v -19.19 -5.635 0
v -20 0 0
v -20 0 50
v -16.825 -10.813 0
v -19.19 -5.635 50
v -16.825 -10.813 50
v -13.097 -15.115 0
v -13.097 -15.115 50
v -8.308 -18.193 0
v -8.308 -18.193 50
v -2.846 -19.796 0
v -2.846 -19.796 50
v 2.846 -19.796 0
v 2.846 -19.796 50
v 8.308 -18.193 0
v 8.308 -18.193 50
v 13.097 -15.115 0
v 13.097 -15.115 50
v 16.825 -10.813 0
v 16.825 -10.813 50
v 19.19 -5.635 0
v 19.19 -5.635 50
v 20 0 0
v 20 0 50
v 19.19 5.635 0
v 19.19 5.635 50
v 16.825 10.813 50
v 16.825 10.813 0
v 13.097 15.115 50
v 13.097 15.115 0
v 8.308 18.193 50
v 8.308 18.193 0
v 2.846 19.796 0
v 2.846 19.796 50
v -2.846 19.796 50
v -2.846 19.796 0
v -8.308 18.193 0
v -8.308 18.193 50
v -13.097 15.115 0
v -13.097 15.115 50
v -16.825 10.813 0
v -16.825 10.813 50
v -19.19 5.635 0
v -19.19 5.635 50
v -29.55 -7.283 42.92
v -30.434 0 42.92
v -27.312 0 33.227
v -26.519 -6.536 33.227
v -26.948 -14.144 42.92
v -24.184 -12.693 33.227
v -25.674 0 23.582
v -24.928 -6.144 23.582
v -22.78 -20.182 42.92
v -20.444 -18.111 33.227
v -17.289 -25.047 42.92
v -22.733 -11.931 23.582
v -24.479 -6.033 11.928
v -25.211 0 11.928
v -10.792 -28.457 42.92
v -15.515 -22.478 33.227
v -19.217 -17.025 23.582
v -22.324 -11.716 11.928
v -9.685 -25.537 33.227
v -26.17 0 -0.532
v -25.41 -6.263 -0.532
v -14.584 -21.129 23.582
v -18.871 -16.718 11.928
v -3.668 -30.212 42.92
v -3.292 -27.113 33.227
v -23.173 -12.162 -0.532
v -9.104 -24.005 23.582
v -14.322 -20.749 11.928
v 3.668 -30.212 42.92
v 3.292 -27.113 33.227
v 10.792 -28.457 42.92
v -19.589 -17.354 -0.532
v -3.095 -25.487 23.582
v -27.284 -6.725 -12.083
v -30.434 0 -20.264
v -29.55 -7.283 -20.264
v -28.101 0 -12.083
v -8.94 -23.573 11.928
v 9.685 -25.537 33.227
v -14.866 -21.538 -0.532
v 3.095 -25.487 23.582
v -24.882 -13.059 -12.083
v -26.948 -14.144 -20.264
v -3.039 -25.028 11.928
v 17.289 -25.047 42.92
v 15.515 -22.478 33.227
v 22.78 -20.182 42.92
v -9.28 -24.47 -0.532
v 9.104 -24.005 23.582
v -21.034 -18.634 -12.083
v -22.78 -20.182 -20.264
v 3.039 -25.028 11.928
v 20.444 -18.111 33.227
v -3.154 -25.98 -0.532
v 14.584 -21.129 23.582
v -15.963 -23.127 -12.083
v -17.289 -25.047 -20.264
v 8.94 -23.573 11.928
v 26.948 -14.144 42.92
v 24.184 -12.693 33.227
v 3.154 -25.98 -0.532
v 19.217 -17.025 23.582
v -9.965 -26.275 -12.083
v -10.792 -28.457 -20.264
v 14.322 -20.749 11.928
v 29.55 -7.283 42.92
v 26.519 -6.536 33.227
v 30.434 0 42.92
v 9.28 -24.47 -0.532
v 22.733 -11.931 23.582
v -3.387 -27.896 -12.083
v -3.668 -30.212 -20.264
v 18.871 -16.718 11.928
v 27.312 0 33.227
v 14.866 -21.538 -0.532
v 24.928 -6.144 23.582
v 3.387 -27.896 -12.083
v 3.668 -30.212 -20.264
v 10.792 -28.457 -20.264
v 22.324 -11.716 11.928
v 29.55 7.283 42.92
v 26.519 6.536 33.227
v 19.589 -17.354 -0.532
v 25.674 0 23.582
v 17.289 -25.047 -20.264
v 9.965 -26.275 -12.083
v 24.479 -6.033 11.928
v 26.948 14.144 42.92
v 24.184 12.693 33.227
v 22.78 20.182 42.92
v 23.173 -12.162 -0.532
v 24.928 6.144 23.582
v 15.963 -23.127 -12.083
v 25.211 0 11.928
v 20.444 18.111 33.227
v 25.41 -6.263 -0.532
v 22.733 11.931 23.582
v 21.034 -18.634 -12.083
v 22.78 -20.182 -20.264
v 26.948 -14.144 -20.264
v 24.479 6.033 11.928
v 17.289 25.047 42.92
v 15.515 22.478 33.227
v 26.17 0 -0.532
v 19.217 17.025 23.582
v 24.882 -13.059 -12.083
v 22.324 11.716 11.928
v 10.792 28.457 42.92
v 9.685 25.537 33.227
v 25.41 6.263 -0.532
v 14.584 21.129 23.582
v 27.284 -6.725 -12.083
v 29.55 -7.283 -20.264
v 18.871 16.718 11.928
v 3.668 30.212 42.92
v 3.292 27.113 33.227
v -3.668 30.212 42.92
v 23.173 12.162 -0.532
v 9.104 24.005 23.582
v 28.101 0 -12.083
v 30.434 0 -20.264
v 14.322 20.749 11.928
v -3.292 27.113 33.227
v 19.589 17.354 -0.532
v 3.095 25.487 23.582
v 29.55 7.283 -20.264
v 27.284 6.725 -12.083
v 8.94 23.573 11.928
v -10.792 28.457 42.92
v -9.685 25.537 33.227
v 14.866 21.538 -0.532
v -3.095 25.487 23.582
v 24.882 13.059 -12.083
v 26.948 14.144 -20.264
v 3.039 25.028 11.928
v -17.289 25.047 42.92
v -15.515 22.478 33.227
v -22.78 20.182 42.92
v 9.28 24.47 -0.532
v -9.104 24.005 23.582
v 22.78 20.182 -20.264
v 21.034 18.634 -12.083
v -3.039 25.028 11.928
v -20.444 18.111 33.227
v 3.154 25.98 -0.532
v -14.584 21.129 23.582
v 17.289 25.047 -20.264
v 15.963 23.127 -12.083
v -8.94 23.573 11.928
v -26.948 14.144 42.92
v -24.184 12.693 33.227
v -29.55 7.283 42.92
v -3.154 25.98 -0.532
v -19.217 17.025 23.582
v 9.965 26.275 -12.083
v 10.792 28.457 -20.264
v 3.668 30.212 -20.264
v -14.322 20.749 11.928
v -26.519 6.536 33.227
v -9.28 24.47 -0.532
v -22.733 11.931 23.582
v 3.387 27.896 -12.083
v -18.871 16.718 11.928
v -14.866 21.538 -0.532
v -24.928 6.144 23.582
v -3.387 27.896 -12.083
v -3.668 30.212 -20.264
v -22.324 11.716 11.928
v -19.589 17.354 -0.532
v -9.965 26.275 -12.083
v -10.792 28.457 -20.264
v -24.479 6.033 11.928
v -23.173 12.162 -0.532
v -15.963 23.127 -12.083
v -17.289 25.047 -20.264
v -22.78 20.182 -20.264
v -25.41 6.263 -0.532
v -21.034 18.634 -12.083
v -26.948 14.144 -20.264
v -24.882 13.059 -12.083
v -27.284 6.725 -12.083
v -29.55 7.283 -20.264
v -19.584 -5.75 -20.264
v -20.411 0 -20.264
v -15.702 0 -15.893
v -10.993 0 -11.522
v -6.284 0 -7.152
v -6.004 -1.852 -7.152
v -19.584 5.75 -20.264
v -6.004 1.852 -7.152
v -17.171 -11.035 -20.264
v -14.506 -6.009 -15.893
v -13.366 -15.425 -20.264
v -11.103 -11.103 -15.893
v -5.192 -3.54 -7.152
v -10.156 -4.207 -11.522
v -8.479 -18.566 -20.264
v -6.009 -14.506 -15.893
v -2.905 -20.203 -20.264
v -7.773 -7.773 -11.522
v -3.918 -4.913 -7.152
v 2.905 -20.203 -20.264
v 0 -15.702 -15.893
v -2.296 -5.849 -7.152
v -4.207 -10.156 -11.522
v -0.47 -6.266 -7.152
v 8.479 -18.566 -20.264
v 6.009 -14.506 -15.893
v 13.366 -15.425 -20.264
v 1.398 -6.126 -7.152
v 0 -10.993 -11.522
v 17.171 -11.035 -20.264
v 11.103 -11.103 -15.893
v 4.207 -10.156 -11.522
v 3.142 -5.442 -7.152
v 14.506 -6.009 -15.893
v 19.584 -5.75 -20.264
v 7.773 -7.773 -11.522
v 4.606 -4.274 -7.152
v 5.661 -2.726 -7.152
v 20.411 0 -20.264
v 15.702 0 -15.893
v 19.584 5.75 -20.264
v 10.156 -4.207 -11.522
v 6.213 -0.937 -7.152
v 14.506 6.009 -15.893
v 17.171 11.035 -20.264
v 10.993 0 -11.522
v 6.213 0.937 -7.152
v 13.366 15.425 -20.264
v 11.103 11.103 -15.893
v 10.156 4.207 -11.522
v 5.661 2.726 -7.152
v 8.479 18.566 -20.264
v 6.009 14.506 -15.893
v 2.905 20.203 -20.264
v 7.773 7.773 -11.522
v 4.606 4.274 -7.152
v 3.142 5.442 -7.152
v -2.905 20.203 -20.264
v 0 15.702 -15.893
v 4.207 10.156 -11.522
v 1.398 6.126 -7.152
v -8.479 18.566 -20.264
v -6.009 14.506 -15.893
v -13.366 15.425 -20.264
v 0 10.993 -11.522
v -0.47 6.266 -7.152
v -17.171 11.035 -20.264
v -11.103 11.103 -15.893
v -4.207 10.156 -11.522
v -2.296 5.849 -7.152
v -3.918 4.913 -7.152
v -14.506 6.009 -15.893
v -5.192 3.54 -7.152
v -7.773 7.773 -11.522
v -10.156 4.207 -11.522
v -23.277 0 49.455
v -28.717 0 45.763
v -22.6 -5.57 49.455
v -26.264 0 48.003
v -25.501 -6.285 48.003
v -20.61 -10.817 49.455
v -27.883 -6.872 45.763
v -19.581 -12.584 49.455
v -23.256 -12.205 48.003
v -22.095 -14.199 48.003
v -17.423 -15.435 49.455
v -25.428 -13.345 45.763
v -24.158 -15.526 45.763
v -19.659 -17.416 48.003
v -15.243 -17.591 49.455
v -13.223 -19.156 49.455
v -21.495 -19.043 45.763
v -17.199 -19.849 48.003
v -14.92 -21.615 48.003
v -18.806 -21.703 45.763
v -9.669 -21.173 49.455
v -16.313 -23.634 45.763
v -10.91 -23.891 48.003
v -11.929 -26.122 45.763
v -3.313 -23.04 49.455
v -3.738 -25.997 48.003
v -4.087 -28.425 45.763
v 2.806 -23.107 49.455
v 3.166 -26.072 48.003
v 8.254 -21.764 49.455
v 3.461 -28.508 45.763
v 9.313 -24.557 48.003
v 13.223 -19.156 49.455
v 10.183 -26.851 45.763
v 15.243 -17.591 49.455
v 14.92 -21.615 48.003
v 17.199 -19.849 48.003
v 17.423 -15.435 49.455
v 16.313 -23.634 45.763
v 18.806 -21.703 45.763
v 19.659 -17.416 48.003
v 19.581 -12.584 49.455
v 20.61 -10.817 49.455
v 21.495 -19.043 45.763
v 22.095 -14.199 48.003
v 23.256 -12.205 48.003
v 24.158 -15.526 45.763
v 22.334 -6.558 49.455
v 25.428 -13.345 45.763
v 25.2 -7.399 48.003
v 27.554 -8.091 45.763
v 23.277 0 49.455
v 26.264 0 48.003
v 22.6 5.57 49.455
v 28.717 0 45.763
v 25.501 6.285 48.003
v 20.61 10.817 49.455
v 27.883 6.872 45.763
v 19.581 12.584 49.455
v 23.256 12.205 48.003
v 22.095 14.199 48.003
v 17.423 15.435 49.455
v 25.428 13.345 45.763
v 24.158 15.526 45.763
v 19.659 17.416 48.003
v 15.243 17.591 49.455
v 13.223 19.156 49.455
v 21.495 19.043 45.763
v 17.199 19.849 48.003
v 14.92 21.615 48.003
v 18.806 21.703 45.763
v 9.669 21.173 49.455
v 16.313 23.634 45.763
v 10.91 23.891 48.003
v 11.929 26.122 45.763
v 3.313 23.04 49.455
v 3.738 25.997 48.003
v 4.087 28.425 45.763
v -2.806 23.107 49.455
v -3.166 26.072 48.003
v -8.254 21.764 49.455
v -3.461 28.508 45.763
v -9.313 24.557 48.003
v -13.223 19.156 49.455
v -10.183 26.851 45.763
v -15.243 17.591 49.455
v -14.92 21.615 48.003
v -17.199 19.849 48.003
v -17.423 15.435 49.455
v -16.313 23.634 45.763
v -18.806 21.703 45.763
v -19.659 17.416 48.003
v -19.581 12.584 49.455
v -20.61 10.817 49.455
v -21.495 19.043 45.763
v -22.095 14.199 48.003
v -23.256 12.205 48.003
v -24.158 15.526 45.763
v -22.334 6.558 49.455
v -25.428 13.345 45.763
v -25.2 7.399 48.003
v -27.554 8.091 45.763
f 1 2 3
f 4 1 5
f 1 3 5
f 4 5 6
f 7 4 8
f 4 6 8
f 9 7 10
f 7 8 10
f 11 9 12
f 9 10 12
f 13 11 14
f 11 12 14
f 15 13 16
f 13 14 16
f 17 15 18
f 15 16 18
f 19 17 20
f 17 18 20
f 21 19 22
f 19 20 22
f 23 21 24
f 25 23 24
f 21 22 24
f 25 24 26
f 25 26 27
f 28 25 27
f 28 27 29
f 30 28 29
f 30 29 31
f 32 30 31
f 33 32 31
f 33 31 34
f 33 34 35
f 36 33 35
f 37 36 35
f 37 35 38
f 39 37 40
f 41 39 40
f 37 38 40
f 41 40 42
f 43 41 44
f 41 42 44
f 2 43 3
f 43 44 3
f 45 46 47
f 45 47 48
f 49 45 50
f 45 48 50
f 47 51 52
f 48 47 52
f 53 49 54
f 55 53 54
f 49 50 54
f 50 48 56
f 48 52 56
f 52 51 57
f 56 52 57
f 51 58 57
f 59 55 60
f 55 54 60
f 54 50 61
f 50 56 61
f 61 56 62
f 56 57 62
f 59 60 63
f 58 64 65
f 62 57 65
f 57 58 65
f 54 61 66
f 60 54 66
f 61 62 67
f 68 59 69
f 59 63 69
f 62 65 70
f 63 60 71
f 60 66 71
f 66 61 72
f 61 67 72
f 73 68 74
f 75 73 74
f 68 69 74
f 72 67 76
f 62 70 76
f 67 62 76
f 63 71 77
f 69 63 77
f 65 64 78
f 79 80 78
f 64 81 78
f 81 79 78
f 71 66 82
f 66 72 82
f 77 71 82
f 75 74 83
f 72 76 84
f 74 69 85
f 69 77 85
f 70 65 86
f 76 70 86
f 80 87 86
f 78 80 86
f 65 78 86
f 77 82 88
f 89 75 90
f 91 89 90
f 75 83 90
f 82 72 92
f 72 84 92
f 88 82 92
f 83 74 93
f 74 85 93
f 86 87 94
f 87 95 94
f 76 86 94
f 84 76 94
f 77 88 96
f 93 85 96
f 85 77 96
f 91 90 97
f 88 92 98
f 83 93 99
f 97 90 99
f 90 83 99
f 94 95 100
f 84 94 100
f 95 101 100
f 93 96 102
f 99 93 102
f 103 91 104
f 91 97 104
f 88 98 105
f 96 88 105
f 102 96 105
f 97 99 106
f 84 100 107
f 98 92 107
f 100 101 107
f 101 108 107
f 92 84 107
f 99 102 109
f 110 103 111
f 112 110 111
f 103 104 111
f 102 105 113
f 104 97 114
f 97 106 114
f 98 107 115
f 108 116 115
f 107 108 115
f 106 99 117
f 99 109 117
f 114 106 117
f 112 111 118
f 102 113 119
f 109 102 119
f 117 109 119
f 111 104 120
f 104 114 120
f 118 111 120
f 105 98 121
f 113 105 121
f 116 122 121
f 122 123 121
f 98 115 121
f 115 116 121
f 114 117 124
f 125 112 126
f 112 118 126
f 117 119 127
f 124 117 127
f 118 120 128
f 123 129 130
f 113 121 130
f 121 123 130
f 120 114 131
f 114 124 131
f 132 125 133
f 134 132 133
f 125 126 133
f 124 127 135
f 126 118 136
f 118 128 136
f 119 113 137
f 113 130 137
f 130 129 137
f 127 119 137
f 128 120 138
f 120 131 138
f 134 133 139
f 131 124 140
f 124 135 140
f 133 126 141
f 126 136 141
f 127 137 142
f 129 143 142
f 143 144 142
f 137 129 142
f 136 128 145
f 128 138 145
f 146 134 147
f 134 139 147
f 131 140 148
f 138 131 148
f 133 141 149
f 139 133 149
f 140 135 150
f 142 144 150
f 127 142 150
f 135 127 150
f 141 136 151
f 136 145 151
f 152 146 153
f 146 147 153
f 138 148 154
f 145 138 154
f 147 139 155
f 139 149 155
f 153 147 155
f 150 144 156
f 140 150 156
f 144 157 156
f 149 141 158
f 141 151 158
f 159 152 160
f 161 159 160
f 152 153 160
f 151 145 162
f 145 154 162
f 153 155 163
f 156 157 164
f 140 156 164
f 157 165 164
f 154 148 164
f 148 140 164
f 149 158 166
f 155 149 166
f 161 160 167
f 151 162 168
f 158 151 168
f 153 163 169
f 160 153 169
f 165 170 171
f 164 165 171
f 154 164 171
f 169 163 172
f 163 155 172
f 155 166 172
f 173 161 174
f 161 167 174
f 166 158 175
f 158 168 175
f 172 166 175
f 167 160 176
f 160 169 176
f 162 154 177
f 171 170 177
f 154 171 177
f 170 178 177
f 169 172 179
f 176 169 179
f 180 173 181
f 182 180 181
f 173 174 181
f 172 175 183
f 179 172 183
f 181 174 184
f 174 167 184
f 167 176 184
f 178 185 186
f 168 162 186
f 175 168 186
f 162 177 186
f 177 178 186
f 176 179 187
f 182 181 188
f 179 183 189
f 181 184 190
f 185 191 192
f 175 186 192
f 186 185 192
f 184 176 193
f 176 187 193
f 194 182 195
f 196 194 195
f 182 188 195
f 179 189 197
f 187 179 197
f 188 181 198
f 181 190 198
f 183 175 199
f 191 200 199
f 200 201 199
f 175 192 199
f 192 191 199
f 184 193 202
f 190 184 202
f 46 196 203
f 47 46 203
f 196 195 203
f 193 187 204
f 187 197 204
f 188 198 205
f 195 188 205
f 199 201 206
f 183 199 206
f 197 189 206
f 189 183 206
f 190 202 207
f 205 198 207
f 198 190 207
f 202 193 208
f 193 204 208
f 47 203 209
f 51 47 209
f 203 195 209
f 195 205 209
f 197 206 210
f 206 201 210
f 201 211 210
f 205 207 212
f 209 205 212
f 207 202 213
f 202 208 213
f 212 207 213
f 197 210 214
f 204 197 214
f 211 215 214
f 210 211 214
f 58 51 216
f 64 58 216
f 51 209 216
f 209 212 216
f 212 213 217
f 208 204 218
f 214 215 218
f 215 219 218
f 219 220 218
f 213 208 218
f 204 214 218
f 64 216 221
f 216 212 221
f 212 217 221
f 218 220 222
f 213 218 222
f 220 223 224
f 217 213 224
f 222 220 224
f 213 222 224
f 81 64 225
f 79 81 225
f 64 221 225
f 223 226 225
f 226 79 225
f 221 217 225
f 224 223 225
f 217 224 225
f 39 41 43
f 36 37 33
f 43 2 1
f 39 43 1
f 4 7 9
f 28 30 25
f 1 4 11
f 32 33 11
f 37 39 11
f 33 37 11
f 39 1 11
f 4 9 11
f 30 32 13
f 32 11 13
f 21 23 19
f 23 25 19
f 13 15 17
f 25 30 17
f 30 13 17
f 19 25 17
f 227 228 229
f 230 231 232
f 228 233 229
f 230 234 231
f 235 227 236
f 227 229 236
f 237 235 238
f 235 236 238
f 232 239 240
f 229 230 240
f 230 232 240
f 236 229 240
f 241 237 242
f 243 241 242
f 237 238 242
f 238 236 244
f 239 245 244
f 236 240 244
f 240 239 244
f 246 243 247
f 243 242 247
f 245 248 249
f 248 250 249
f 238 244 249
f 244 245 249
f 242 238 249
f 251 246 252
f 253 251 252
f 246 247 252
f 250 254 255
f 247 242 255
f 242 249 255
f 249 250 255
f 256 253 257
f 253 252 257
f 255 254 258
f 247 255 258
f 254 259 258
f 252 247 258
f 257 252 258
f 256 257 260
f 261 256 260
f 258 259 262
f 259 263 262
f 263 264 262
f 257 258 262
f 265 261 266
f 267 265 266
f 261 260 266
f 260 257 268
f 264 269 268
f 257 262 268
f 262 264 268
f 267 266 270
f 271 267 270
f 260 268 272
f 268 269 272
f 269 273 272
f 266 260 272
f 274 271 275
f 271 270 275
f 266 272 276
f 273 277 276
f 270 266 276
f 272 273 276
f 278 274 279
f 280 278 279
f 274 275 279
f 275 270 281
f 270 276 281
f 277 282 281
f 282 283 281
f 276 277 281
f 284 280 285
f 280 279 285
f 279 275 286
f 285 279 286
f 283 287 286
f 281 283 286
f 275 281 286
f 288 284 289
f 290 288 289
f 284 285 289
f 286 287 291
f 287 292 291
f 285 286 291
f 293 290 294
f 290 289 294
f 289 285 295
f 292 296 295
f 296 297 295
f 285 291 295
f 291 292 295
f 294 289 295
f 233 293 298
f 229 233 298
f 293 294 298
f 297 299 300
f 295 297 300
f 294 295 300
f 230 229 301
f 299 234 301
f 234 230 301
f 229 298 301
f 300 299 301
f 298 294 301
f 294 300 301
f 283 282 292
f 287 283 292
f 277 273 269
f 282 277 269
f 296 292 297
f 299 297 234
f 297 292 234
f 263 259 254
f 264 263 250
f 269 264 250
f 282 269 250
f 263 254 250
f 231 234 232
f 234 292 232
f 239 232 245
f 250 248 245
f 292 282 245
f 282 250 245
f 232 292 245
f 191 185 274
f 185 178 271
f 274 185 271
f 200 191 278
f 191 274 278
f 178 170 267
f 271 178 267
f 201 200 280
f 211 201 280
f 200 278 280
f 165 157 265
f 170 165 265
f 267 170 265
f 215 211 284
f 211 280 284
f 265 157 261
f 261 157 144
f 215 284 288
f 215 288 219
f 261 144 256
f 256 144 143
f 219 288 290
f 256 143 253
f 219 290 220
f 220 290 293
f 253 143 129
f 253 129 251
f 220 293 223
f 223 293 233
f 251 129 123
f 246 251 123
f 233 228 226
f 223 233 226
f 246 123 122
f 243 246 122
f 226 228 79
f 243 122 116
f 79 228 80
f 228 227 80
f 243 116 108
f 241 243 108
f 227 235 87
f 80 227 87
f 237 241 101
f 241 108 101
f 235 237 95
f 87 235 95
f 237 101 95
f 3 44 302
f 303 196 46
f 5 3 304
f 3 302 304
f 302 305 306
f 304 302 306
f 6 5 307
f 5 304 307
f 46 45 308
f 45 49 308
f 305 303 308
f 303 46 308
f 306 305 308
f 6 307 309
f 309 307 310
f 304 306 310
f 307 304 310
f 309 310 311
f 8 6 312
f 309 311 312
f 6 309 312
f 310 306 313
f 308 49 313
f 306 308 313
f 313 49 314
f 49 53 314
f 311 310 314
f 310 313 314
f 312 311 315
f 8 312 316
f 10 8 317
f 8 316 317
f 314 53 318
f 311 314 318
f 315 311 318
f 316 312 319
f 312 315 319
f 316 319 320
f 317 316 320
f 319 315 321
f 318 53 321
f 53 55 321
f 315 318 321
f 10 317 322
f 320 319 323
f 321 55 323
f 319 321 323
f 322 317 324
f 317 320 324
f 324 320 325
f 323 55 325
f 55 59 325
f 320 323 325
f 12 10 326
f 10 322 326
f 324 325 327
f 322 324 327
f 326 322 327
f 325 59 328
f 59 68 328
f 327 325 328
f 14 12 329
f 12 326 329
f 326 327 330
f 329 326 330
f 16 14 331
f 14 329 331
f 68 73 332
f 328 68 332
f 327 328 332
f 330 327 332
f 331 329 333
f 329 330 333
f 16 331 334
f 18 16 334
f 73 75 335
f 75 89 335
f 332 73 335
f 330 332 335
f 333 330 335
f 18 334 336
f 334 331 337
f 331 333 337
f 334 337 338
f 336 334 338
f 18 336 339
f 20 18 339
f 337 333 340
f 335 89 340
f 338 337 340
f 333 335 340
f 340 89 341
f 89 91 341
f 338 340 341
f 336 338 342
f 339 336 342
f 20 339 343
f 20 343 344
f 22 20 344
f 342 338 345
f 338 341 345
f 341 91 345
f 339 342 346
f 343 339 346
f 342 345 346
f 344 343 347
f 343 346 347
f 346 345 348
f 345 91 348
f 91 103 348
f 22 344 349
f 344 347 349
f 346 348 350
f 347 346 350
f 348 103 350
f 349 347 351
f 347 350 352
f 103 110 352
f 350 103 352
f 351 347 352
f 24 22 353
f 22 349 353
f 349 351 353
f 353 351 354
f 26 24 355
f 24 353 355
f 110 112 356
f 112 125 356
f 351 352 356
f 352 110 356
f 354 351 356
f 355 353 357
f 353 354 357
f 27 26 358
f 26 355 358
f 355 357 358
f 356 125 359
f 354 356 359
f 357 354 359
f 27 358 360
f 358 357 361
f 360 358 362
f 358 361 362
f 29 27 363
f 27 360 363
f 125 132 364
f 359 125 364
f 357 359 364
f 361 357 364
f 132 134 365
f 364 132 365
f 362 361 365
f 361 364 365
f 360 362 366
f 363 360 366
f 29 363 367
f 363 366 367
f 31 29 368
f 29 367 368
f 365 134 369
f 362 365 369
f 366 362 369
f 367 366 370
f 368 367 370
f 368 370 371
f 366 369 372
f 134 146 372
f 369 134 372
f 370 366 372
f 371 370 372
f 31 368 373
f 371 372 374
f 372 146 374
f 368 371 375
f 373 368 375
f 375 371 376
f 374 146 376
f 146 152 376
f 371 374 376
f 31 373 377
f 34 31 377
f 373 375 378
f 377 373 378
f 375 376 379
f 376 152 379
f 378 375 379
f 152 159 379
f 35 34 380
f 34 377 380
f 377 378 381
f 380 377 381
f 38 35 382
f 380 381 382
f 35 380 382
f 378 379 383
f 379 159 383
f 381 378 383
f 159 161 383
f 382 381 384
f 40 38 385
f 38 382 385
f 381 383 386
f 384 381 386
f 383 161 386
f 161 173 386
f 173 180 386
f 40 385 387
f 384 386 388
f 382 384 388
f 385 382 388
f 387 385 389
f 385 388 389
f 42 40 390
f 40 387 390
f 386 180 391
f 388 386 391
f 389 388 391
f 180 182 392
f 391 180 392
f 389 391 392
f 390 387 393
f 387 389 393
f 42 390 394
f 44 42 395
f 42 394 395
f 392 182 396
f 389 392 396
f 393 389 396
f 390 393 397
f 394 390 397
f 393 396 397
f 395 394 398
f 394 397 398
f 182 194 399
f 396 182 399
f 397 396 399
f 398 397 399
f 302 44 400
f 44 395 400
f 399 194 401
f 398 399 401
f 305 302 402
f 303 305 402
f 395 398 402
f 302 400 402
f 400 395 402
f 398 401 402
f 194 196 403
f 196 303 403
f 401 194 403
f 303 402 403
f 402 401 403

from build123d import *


with BuildPart() as f1:
    # F0 (on Front) → F1 (revolve)
    with BuildSketch(Plane.XZ):
        with BuildLine():
            Line((0, -7.1515361778), (0, 0))
            Line((0, 0), (-20, 0))
            Line((-20, 0), (-20, 50))
            ThreePointArc((-20, 50), (-26.2639441628, 48.0027957129), (-30.4342843592, 42.9200716317))
            add(Edge.make_bspline(
                [(-30.4342843592, 42.9200716317), (-23.0259504169, 25), (-26.2022933276, -4.9414957363), (-28.9502672666, -16.1926268841), (-30.4342843592, -20.2638860792)],
                knots=[0, 0, 0, 0, 0.6447568554, 1, 1, 1, 1], degree=3))
            Line((-30.4342843592, -20.2638860792), (-20.410772413, -20.2638860792))
            Line((-20.410772413, -20.2638860792), (-6.2835924327, -7.1515361778))
            Line((-6.2835924327, -7.1515361778), (0, -7.1515361778))
        make_face()
    revolve(axis=Axis((0, 0, 56.0435913503), (0, 0, 1)))


solid = f1.part
